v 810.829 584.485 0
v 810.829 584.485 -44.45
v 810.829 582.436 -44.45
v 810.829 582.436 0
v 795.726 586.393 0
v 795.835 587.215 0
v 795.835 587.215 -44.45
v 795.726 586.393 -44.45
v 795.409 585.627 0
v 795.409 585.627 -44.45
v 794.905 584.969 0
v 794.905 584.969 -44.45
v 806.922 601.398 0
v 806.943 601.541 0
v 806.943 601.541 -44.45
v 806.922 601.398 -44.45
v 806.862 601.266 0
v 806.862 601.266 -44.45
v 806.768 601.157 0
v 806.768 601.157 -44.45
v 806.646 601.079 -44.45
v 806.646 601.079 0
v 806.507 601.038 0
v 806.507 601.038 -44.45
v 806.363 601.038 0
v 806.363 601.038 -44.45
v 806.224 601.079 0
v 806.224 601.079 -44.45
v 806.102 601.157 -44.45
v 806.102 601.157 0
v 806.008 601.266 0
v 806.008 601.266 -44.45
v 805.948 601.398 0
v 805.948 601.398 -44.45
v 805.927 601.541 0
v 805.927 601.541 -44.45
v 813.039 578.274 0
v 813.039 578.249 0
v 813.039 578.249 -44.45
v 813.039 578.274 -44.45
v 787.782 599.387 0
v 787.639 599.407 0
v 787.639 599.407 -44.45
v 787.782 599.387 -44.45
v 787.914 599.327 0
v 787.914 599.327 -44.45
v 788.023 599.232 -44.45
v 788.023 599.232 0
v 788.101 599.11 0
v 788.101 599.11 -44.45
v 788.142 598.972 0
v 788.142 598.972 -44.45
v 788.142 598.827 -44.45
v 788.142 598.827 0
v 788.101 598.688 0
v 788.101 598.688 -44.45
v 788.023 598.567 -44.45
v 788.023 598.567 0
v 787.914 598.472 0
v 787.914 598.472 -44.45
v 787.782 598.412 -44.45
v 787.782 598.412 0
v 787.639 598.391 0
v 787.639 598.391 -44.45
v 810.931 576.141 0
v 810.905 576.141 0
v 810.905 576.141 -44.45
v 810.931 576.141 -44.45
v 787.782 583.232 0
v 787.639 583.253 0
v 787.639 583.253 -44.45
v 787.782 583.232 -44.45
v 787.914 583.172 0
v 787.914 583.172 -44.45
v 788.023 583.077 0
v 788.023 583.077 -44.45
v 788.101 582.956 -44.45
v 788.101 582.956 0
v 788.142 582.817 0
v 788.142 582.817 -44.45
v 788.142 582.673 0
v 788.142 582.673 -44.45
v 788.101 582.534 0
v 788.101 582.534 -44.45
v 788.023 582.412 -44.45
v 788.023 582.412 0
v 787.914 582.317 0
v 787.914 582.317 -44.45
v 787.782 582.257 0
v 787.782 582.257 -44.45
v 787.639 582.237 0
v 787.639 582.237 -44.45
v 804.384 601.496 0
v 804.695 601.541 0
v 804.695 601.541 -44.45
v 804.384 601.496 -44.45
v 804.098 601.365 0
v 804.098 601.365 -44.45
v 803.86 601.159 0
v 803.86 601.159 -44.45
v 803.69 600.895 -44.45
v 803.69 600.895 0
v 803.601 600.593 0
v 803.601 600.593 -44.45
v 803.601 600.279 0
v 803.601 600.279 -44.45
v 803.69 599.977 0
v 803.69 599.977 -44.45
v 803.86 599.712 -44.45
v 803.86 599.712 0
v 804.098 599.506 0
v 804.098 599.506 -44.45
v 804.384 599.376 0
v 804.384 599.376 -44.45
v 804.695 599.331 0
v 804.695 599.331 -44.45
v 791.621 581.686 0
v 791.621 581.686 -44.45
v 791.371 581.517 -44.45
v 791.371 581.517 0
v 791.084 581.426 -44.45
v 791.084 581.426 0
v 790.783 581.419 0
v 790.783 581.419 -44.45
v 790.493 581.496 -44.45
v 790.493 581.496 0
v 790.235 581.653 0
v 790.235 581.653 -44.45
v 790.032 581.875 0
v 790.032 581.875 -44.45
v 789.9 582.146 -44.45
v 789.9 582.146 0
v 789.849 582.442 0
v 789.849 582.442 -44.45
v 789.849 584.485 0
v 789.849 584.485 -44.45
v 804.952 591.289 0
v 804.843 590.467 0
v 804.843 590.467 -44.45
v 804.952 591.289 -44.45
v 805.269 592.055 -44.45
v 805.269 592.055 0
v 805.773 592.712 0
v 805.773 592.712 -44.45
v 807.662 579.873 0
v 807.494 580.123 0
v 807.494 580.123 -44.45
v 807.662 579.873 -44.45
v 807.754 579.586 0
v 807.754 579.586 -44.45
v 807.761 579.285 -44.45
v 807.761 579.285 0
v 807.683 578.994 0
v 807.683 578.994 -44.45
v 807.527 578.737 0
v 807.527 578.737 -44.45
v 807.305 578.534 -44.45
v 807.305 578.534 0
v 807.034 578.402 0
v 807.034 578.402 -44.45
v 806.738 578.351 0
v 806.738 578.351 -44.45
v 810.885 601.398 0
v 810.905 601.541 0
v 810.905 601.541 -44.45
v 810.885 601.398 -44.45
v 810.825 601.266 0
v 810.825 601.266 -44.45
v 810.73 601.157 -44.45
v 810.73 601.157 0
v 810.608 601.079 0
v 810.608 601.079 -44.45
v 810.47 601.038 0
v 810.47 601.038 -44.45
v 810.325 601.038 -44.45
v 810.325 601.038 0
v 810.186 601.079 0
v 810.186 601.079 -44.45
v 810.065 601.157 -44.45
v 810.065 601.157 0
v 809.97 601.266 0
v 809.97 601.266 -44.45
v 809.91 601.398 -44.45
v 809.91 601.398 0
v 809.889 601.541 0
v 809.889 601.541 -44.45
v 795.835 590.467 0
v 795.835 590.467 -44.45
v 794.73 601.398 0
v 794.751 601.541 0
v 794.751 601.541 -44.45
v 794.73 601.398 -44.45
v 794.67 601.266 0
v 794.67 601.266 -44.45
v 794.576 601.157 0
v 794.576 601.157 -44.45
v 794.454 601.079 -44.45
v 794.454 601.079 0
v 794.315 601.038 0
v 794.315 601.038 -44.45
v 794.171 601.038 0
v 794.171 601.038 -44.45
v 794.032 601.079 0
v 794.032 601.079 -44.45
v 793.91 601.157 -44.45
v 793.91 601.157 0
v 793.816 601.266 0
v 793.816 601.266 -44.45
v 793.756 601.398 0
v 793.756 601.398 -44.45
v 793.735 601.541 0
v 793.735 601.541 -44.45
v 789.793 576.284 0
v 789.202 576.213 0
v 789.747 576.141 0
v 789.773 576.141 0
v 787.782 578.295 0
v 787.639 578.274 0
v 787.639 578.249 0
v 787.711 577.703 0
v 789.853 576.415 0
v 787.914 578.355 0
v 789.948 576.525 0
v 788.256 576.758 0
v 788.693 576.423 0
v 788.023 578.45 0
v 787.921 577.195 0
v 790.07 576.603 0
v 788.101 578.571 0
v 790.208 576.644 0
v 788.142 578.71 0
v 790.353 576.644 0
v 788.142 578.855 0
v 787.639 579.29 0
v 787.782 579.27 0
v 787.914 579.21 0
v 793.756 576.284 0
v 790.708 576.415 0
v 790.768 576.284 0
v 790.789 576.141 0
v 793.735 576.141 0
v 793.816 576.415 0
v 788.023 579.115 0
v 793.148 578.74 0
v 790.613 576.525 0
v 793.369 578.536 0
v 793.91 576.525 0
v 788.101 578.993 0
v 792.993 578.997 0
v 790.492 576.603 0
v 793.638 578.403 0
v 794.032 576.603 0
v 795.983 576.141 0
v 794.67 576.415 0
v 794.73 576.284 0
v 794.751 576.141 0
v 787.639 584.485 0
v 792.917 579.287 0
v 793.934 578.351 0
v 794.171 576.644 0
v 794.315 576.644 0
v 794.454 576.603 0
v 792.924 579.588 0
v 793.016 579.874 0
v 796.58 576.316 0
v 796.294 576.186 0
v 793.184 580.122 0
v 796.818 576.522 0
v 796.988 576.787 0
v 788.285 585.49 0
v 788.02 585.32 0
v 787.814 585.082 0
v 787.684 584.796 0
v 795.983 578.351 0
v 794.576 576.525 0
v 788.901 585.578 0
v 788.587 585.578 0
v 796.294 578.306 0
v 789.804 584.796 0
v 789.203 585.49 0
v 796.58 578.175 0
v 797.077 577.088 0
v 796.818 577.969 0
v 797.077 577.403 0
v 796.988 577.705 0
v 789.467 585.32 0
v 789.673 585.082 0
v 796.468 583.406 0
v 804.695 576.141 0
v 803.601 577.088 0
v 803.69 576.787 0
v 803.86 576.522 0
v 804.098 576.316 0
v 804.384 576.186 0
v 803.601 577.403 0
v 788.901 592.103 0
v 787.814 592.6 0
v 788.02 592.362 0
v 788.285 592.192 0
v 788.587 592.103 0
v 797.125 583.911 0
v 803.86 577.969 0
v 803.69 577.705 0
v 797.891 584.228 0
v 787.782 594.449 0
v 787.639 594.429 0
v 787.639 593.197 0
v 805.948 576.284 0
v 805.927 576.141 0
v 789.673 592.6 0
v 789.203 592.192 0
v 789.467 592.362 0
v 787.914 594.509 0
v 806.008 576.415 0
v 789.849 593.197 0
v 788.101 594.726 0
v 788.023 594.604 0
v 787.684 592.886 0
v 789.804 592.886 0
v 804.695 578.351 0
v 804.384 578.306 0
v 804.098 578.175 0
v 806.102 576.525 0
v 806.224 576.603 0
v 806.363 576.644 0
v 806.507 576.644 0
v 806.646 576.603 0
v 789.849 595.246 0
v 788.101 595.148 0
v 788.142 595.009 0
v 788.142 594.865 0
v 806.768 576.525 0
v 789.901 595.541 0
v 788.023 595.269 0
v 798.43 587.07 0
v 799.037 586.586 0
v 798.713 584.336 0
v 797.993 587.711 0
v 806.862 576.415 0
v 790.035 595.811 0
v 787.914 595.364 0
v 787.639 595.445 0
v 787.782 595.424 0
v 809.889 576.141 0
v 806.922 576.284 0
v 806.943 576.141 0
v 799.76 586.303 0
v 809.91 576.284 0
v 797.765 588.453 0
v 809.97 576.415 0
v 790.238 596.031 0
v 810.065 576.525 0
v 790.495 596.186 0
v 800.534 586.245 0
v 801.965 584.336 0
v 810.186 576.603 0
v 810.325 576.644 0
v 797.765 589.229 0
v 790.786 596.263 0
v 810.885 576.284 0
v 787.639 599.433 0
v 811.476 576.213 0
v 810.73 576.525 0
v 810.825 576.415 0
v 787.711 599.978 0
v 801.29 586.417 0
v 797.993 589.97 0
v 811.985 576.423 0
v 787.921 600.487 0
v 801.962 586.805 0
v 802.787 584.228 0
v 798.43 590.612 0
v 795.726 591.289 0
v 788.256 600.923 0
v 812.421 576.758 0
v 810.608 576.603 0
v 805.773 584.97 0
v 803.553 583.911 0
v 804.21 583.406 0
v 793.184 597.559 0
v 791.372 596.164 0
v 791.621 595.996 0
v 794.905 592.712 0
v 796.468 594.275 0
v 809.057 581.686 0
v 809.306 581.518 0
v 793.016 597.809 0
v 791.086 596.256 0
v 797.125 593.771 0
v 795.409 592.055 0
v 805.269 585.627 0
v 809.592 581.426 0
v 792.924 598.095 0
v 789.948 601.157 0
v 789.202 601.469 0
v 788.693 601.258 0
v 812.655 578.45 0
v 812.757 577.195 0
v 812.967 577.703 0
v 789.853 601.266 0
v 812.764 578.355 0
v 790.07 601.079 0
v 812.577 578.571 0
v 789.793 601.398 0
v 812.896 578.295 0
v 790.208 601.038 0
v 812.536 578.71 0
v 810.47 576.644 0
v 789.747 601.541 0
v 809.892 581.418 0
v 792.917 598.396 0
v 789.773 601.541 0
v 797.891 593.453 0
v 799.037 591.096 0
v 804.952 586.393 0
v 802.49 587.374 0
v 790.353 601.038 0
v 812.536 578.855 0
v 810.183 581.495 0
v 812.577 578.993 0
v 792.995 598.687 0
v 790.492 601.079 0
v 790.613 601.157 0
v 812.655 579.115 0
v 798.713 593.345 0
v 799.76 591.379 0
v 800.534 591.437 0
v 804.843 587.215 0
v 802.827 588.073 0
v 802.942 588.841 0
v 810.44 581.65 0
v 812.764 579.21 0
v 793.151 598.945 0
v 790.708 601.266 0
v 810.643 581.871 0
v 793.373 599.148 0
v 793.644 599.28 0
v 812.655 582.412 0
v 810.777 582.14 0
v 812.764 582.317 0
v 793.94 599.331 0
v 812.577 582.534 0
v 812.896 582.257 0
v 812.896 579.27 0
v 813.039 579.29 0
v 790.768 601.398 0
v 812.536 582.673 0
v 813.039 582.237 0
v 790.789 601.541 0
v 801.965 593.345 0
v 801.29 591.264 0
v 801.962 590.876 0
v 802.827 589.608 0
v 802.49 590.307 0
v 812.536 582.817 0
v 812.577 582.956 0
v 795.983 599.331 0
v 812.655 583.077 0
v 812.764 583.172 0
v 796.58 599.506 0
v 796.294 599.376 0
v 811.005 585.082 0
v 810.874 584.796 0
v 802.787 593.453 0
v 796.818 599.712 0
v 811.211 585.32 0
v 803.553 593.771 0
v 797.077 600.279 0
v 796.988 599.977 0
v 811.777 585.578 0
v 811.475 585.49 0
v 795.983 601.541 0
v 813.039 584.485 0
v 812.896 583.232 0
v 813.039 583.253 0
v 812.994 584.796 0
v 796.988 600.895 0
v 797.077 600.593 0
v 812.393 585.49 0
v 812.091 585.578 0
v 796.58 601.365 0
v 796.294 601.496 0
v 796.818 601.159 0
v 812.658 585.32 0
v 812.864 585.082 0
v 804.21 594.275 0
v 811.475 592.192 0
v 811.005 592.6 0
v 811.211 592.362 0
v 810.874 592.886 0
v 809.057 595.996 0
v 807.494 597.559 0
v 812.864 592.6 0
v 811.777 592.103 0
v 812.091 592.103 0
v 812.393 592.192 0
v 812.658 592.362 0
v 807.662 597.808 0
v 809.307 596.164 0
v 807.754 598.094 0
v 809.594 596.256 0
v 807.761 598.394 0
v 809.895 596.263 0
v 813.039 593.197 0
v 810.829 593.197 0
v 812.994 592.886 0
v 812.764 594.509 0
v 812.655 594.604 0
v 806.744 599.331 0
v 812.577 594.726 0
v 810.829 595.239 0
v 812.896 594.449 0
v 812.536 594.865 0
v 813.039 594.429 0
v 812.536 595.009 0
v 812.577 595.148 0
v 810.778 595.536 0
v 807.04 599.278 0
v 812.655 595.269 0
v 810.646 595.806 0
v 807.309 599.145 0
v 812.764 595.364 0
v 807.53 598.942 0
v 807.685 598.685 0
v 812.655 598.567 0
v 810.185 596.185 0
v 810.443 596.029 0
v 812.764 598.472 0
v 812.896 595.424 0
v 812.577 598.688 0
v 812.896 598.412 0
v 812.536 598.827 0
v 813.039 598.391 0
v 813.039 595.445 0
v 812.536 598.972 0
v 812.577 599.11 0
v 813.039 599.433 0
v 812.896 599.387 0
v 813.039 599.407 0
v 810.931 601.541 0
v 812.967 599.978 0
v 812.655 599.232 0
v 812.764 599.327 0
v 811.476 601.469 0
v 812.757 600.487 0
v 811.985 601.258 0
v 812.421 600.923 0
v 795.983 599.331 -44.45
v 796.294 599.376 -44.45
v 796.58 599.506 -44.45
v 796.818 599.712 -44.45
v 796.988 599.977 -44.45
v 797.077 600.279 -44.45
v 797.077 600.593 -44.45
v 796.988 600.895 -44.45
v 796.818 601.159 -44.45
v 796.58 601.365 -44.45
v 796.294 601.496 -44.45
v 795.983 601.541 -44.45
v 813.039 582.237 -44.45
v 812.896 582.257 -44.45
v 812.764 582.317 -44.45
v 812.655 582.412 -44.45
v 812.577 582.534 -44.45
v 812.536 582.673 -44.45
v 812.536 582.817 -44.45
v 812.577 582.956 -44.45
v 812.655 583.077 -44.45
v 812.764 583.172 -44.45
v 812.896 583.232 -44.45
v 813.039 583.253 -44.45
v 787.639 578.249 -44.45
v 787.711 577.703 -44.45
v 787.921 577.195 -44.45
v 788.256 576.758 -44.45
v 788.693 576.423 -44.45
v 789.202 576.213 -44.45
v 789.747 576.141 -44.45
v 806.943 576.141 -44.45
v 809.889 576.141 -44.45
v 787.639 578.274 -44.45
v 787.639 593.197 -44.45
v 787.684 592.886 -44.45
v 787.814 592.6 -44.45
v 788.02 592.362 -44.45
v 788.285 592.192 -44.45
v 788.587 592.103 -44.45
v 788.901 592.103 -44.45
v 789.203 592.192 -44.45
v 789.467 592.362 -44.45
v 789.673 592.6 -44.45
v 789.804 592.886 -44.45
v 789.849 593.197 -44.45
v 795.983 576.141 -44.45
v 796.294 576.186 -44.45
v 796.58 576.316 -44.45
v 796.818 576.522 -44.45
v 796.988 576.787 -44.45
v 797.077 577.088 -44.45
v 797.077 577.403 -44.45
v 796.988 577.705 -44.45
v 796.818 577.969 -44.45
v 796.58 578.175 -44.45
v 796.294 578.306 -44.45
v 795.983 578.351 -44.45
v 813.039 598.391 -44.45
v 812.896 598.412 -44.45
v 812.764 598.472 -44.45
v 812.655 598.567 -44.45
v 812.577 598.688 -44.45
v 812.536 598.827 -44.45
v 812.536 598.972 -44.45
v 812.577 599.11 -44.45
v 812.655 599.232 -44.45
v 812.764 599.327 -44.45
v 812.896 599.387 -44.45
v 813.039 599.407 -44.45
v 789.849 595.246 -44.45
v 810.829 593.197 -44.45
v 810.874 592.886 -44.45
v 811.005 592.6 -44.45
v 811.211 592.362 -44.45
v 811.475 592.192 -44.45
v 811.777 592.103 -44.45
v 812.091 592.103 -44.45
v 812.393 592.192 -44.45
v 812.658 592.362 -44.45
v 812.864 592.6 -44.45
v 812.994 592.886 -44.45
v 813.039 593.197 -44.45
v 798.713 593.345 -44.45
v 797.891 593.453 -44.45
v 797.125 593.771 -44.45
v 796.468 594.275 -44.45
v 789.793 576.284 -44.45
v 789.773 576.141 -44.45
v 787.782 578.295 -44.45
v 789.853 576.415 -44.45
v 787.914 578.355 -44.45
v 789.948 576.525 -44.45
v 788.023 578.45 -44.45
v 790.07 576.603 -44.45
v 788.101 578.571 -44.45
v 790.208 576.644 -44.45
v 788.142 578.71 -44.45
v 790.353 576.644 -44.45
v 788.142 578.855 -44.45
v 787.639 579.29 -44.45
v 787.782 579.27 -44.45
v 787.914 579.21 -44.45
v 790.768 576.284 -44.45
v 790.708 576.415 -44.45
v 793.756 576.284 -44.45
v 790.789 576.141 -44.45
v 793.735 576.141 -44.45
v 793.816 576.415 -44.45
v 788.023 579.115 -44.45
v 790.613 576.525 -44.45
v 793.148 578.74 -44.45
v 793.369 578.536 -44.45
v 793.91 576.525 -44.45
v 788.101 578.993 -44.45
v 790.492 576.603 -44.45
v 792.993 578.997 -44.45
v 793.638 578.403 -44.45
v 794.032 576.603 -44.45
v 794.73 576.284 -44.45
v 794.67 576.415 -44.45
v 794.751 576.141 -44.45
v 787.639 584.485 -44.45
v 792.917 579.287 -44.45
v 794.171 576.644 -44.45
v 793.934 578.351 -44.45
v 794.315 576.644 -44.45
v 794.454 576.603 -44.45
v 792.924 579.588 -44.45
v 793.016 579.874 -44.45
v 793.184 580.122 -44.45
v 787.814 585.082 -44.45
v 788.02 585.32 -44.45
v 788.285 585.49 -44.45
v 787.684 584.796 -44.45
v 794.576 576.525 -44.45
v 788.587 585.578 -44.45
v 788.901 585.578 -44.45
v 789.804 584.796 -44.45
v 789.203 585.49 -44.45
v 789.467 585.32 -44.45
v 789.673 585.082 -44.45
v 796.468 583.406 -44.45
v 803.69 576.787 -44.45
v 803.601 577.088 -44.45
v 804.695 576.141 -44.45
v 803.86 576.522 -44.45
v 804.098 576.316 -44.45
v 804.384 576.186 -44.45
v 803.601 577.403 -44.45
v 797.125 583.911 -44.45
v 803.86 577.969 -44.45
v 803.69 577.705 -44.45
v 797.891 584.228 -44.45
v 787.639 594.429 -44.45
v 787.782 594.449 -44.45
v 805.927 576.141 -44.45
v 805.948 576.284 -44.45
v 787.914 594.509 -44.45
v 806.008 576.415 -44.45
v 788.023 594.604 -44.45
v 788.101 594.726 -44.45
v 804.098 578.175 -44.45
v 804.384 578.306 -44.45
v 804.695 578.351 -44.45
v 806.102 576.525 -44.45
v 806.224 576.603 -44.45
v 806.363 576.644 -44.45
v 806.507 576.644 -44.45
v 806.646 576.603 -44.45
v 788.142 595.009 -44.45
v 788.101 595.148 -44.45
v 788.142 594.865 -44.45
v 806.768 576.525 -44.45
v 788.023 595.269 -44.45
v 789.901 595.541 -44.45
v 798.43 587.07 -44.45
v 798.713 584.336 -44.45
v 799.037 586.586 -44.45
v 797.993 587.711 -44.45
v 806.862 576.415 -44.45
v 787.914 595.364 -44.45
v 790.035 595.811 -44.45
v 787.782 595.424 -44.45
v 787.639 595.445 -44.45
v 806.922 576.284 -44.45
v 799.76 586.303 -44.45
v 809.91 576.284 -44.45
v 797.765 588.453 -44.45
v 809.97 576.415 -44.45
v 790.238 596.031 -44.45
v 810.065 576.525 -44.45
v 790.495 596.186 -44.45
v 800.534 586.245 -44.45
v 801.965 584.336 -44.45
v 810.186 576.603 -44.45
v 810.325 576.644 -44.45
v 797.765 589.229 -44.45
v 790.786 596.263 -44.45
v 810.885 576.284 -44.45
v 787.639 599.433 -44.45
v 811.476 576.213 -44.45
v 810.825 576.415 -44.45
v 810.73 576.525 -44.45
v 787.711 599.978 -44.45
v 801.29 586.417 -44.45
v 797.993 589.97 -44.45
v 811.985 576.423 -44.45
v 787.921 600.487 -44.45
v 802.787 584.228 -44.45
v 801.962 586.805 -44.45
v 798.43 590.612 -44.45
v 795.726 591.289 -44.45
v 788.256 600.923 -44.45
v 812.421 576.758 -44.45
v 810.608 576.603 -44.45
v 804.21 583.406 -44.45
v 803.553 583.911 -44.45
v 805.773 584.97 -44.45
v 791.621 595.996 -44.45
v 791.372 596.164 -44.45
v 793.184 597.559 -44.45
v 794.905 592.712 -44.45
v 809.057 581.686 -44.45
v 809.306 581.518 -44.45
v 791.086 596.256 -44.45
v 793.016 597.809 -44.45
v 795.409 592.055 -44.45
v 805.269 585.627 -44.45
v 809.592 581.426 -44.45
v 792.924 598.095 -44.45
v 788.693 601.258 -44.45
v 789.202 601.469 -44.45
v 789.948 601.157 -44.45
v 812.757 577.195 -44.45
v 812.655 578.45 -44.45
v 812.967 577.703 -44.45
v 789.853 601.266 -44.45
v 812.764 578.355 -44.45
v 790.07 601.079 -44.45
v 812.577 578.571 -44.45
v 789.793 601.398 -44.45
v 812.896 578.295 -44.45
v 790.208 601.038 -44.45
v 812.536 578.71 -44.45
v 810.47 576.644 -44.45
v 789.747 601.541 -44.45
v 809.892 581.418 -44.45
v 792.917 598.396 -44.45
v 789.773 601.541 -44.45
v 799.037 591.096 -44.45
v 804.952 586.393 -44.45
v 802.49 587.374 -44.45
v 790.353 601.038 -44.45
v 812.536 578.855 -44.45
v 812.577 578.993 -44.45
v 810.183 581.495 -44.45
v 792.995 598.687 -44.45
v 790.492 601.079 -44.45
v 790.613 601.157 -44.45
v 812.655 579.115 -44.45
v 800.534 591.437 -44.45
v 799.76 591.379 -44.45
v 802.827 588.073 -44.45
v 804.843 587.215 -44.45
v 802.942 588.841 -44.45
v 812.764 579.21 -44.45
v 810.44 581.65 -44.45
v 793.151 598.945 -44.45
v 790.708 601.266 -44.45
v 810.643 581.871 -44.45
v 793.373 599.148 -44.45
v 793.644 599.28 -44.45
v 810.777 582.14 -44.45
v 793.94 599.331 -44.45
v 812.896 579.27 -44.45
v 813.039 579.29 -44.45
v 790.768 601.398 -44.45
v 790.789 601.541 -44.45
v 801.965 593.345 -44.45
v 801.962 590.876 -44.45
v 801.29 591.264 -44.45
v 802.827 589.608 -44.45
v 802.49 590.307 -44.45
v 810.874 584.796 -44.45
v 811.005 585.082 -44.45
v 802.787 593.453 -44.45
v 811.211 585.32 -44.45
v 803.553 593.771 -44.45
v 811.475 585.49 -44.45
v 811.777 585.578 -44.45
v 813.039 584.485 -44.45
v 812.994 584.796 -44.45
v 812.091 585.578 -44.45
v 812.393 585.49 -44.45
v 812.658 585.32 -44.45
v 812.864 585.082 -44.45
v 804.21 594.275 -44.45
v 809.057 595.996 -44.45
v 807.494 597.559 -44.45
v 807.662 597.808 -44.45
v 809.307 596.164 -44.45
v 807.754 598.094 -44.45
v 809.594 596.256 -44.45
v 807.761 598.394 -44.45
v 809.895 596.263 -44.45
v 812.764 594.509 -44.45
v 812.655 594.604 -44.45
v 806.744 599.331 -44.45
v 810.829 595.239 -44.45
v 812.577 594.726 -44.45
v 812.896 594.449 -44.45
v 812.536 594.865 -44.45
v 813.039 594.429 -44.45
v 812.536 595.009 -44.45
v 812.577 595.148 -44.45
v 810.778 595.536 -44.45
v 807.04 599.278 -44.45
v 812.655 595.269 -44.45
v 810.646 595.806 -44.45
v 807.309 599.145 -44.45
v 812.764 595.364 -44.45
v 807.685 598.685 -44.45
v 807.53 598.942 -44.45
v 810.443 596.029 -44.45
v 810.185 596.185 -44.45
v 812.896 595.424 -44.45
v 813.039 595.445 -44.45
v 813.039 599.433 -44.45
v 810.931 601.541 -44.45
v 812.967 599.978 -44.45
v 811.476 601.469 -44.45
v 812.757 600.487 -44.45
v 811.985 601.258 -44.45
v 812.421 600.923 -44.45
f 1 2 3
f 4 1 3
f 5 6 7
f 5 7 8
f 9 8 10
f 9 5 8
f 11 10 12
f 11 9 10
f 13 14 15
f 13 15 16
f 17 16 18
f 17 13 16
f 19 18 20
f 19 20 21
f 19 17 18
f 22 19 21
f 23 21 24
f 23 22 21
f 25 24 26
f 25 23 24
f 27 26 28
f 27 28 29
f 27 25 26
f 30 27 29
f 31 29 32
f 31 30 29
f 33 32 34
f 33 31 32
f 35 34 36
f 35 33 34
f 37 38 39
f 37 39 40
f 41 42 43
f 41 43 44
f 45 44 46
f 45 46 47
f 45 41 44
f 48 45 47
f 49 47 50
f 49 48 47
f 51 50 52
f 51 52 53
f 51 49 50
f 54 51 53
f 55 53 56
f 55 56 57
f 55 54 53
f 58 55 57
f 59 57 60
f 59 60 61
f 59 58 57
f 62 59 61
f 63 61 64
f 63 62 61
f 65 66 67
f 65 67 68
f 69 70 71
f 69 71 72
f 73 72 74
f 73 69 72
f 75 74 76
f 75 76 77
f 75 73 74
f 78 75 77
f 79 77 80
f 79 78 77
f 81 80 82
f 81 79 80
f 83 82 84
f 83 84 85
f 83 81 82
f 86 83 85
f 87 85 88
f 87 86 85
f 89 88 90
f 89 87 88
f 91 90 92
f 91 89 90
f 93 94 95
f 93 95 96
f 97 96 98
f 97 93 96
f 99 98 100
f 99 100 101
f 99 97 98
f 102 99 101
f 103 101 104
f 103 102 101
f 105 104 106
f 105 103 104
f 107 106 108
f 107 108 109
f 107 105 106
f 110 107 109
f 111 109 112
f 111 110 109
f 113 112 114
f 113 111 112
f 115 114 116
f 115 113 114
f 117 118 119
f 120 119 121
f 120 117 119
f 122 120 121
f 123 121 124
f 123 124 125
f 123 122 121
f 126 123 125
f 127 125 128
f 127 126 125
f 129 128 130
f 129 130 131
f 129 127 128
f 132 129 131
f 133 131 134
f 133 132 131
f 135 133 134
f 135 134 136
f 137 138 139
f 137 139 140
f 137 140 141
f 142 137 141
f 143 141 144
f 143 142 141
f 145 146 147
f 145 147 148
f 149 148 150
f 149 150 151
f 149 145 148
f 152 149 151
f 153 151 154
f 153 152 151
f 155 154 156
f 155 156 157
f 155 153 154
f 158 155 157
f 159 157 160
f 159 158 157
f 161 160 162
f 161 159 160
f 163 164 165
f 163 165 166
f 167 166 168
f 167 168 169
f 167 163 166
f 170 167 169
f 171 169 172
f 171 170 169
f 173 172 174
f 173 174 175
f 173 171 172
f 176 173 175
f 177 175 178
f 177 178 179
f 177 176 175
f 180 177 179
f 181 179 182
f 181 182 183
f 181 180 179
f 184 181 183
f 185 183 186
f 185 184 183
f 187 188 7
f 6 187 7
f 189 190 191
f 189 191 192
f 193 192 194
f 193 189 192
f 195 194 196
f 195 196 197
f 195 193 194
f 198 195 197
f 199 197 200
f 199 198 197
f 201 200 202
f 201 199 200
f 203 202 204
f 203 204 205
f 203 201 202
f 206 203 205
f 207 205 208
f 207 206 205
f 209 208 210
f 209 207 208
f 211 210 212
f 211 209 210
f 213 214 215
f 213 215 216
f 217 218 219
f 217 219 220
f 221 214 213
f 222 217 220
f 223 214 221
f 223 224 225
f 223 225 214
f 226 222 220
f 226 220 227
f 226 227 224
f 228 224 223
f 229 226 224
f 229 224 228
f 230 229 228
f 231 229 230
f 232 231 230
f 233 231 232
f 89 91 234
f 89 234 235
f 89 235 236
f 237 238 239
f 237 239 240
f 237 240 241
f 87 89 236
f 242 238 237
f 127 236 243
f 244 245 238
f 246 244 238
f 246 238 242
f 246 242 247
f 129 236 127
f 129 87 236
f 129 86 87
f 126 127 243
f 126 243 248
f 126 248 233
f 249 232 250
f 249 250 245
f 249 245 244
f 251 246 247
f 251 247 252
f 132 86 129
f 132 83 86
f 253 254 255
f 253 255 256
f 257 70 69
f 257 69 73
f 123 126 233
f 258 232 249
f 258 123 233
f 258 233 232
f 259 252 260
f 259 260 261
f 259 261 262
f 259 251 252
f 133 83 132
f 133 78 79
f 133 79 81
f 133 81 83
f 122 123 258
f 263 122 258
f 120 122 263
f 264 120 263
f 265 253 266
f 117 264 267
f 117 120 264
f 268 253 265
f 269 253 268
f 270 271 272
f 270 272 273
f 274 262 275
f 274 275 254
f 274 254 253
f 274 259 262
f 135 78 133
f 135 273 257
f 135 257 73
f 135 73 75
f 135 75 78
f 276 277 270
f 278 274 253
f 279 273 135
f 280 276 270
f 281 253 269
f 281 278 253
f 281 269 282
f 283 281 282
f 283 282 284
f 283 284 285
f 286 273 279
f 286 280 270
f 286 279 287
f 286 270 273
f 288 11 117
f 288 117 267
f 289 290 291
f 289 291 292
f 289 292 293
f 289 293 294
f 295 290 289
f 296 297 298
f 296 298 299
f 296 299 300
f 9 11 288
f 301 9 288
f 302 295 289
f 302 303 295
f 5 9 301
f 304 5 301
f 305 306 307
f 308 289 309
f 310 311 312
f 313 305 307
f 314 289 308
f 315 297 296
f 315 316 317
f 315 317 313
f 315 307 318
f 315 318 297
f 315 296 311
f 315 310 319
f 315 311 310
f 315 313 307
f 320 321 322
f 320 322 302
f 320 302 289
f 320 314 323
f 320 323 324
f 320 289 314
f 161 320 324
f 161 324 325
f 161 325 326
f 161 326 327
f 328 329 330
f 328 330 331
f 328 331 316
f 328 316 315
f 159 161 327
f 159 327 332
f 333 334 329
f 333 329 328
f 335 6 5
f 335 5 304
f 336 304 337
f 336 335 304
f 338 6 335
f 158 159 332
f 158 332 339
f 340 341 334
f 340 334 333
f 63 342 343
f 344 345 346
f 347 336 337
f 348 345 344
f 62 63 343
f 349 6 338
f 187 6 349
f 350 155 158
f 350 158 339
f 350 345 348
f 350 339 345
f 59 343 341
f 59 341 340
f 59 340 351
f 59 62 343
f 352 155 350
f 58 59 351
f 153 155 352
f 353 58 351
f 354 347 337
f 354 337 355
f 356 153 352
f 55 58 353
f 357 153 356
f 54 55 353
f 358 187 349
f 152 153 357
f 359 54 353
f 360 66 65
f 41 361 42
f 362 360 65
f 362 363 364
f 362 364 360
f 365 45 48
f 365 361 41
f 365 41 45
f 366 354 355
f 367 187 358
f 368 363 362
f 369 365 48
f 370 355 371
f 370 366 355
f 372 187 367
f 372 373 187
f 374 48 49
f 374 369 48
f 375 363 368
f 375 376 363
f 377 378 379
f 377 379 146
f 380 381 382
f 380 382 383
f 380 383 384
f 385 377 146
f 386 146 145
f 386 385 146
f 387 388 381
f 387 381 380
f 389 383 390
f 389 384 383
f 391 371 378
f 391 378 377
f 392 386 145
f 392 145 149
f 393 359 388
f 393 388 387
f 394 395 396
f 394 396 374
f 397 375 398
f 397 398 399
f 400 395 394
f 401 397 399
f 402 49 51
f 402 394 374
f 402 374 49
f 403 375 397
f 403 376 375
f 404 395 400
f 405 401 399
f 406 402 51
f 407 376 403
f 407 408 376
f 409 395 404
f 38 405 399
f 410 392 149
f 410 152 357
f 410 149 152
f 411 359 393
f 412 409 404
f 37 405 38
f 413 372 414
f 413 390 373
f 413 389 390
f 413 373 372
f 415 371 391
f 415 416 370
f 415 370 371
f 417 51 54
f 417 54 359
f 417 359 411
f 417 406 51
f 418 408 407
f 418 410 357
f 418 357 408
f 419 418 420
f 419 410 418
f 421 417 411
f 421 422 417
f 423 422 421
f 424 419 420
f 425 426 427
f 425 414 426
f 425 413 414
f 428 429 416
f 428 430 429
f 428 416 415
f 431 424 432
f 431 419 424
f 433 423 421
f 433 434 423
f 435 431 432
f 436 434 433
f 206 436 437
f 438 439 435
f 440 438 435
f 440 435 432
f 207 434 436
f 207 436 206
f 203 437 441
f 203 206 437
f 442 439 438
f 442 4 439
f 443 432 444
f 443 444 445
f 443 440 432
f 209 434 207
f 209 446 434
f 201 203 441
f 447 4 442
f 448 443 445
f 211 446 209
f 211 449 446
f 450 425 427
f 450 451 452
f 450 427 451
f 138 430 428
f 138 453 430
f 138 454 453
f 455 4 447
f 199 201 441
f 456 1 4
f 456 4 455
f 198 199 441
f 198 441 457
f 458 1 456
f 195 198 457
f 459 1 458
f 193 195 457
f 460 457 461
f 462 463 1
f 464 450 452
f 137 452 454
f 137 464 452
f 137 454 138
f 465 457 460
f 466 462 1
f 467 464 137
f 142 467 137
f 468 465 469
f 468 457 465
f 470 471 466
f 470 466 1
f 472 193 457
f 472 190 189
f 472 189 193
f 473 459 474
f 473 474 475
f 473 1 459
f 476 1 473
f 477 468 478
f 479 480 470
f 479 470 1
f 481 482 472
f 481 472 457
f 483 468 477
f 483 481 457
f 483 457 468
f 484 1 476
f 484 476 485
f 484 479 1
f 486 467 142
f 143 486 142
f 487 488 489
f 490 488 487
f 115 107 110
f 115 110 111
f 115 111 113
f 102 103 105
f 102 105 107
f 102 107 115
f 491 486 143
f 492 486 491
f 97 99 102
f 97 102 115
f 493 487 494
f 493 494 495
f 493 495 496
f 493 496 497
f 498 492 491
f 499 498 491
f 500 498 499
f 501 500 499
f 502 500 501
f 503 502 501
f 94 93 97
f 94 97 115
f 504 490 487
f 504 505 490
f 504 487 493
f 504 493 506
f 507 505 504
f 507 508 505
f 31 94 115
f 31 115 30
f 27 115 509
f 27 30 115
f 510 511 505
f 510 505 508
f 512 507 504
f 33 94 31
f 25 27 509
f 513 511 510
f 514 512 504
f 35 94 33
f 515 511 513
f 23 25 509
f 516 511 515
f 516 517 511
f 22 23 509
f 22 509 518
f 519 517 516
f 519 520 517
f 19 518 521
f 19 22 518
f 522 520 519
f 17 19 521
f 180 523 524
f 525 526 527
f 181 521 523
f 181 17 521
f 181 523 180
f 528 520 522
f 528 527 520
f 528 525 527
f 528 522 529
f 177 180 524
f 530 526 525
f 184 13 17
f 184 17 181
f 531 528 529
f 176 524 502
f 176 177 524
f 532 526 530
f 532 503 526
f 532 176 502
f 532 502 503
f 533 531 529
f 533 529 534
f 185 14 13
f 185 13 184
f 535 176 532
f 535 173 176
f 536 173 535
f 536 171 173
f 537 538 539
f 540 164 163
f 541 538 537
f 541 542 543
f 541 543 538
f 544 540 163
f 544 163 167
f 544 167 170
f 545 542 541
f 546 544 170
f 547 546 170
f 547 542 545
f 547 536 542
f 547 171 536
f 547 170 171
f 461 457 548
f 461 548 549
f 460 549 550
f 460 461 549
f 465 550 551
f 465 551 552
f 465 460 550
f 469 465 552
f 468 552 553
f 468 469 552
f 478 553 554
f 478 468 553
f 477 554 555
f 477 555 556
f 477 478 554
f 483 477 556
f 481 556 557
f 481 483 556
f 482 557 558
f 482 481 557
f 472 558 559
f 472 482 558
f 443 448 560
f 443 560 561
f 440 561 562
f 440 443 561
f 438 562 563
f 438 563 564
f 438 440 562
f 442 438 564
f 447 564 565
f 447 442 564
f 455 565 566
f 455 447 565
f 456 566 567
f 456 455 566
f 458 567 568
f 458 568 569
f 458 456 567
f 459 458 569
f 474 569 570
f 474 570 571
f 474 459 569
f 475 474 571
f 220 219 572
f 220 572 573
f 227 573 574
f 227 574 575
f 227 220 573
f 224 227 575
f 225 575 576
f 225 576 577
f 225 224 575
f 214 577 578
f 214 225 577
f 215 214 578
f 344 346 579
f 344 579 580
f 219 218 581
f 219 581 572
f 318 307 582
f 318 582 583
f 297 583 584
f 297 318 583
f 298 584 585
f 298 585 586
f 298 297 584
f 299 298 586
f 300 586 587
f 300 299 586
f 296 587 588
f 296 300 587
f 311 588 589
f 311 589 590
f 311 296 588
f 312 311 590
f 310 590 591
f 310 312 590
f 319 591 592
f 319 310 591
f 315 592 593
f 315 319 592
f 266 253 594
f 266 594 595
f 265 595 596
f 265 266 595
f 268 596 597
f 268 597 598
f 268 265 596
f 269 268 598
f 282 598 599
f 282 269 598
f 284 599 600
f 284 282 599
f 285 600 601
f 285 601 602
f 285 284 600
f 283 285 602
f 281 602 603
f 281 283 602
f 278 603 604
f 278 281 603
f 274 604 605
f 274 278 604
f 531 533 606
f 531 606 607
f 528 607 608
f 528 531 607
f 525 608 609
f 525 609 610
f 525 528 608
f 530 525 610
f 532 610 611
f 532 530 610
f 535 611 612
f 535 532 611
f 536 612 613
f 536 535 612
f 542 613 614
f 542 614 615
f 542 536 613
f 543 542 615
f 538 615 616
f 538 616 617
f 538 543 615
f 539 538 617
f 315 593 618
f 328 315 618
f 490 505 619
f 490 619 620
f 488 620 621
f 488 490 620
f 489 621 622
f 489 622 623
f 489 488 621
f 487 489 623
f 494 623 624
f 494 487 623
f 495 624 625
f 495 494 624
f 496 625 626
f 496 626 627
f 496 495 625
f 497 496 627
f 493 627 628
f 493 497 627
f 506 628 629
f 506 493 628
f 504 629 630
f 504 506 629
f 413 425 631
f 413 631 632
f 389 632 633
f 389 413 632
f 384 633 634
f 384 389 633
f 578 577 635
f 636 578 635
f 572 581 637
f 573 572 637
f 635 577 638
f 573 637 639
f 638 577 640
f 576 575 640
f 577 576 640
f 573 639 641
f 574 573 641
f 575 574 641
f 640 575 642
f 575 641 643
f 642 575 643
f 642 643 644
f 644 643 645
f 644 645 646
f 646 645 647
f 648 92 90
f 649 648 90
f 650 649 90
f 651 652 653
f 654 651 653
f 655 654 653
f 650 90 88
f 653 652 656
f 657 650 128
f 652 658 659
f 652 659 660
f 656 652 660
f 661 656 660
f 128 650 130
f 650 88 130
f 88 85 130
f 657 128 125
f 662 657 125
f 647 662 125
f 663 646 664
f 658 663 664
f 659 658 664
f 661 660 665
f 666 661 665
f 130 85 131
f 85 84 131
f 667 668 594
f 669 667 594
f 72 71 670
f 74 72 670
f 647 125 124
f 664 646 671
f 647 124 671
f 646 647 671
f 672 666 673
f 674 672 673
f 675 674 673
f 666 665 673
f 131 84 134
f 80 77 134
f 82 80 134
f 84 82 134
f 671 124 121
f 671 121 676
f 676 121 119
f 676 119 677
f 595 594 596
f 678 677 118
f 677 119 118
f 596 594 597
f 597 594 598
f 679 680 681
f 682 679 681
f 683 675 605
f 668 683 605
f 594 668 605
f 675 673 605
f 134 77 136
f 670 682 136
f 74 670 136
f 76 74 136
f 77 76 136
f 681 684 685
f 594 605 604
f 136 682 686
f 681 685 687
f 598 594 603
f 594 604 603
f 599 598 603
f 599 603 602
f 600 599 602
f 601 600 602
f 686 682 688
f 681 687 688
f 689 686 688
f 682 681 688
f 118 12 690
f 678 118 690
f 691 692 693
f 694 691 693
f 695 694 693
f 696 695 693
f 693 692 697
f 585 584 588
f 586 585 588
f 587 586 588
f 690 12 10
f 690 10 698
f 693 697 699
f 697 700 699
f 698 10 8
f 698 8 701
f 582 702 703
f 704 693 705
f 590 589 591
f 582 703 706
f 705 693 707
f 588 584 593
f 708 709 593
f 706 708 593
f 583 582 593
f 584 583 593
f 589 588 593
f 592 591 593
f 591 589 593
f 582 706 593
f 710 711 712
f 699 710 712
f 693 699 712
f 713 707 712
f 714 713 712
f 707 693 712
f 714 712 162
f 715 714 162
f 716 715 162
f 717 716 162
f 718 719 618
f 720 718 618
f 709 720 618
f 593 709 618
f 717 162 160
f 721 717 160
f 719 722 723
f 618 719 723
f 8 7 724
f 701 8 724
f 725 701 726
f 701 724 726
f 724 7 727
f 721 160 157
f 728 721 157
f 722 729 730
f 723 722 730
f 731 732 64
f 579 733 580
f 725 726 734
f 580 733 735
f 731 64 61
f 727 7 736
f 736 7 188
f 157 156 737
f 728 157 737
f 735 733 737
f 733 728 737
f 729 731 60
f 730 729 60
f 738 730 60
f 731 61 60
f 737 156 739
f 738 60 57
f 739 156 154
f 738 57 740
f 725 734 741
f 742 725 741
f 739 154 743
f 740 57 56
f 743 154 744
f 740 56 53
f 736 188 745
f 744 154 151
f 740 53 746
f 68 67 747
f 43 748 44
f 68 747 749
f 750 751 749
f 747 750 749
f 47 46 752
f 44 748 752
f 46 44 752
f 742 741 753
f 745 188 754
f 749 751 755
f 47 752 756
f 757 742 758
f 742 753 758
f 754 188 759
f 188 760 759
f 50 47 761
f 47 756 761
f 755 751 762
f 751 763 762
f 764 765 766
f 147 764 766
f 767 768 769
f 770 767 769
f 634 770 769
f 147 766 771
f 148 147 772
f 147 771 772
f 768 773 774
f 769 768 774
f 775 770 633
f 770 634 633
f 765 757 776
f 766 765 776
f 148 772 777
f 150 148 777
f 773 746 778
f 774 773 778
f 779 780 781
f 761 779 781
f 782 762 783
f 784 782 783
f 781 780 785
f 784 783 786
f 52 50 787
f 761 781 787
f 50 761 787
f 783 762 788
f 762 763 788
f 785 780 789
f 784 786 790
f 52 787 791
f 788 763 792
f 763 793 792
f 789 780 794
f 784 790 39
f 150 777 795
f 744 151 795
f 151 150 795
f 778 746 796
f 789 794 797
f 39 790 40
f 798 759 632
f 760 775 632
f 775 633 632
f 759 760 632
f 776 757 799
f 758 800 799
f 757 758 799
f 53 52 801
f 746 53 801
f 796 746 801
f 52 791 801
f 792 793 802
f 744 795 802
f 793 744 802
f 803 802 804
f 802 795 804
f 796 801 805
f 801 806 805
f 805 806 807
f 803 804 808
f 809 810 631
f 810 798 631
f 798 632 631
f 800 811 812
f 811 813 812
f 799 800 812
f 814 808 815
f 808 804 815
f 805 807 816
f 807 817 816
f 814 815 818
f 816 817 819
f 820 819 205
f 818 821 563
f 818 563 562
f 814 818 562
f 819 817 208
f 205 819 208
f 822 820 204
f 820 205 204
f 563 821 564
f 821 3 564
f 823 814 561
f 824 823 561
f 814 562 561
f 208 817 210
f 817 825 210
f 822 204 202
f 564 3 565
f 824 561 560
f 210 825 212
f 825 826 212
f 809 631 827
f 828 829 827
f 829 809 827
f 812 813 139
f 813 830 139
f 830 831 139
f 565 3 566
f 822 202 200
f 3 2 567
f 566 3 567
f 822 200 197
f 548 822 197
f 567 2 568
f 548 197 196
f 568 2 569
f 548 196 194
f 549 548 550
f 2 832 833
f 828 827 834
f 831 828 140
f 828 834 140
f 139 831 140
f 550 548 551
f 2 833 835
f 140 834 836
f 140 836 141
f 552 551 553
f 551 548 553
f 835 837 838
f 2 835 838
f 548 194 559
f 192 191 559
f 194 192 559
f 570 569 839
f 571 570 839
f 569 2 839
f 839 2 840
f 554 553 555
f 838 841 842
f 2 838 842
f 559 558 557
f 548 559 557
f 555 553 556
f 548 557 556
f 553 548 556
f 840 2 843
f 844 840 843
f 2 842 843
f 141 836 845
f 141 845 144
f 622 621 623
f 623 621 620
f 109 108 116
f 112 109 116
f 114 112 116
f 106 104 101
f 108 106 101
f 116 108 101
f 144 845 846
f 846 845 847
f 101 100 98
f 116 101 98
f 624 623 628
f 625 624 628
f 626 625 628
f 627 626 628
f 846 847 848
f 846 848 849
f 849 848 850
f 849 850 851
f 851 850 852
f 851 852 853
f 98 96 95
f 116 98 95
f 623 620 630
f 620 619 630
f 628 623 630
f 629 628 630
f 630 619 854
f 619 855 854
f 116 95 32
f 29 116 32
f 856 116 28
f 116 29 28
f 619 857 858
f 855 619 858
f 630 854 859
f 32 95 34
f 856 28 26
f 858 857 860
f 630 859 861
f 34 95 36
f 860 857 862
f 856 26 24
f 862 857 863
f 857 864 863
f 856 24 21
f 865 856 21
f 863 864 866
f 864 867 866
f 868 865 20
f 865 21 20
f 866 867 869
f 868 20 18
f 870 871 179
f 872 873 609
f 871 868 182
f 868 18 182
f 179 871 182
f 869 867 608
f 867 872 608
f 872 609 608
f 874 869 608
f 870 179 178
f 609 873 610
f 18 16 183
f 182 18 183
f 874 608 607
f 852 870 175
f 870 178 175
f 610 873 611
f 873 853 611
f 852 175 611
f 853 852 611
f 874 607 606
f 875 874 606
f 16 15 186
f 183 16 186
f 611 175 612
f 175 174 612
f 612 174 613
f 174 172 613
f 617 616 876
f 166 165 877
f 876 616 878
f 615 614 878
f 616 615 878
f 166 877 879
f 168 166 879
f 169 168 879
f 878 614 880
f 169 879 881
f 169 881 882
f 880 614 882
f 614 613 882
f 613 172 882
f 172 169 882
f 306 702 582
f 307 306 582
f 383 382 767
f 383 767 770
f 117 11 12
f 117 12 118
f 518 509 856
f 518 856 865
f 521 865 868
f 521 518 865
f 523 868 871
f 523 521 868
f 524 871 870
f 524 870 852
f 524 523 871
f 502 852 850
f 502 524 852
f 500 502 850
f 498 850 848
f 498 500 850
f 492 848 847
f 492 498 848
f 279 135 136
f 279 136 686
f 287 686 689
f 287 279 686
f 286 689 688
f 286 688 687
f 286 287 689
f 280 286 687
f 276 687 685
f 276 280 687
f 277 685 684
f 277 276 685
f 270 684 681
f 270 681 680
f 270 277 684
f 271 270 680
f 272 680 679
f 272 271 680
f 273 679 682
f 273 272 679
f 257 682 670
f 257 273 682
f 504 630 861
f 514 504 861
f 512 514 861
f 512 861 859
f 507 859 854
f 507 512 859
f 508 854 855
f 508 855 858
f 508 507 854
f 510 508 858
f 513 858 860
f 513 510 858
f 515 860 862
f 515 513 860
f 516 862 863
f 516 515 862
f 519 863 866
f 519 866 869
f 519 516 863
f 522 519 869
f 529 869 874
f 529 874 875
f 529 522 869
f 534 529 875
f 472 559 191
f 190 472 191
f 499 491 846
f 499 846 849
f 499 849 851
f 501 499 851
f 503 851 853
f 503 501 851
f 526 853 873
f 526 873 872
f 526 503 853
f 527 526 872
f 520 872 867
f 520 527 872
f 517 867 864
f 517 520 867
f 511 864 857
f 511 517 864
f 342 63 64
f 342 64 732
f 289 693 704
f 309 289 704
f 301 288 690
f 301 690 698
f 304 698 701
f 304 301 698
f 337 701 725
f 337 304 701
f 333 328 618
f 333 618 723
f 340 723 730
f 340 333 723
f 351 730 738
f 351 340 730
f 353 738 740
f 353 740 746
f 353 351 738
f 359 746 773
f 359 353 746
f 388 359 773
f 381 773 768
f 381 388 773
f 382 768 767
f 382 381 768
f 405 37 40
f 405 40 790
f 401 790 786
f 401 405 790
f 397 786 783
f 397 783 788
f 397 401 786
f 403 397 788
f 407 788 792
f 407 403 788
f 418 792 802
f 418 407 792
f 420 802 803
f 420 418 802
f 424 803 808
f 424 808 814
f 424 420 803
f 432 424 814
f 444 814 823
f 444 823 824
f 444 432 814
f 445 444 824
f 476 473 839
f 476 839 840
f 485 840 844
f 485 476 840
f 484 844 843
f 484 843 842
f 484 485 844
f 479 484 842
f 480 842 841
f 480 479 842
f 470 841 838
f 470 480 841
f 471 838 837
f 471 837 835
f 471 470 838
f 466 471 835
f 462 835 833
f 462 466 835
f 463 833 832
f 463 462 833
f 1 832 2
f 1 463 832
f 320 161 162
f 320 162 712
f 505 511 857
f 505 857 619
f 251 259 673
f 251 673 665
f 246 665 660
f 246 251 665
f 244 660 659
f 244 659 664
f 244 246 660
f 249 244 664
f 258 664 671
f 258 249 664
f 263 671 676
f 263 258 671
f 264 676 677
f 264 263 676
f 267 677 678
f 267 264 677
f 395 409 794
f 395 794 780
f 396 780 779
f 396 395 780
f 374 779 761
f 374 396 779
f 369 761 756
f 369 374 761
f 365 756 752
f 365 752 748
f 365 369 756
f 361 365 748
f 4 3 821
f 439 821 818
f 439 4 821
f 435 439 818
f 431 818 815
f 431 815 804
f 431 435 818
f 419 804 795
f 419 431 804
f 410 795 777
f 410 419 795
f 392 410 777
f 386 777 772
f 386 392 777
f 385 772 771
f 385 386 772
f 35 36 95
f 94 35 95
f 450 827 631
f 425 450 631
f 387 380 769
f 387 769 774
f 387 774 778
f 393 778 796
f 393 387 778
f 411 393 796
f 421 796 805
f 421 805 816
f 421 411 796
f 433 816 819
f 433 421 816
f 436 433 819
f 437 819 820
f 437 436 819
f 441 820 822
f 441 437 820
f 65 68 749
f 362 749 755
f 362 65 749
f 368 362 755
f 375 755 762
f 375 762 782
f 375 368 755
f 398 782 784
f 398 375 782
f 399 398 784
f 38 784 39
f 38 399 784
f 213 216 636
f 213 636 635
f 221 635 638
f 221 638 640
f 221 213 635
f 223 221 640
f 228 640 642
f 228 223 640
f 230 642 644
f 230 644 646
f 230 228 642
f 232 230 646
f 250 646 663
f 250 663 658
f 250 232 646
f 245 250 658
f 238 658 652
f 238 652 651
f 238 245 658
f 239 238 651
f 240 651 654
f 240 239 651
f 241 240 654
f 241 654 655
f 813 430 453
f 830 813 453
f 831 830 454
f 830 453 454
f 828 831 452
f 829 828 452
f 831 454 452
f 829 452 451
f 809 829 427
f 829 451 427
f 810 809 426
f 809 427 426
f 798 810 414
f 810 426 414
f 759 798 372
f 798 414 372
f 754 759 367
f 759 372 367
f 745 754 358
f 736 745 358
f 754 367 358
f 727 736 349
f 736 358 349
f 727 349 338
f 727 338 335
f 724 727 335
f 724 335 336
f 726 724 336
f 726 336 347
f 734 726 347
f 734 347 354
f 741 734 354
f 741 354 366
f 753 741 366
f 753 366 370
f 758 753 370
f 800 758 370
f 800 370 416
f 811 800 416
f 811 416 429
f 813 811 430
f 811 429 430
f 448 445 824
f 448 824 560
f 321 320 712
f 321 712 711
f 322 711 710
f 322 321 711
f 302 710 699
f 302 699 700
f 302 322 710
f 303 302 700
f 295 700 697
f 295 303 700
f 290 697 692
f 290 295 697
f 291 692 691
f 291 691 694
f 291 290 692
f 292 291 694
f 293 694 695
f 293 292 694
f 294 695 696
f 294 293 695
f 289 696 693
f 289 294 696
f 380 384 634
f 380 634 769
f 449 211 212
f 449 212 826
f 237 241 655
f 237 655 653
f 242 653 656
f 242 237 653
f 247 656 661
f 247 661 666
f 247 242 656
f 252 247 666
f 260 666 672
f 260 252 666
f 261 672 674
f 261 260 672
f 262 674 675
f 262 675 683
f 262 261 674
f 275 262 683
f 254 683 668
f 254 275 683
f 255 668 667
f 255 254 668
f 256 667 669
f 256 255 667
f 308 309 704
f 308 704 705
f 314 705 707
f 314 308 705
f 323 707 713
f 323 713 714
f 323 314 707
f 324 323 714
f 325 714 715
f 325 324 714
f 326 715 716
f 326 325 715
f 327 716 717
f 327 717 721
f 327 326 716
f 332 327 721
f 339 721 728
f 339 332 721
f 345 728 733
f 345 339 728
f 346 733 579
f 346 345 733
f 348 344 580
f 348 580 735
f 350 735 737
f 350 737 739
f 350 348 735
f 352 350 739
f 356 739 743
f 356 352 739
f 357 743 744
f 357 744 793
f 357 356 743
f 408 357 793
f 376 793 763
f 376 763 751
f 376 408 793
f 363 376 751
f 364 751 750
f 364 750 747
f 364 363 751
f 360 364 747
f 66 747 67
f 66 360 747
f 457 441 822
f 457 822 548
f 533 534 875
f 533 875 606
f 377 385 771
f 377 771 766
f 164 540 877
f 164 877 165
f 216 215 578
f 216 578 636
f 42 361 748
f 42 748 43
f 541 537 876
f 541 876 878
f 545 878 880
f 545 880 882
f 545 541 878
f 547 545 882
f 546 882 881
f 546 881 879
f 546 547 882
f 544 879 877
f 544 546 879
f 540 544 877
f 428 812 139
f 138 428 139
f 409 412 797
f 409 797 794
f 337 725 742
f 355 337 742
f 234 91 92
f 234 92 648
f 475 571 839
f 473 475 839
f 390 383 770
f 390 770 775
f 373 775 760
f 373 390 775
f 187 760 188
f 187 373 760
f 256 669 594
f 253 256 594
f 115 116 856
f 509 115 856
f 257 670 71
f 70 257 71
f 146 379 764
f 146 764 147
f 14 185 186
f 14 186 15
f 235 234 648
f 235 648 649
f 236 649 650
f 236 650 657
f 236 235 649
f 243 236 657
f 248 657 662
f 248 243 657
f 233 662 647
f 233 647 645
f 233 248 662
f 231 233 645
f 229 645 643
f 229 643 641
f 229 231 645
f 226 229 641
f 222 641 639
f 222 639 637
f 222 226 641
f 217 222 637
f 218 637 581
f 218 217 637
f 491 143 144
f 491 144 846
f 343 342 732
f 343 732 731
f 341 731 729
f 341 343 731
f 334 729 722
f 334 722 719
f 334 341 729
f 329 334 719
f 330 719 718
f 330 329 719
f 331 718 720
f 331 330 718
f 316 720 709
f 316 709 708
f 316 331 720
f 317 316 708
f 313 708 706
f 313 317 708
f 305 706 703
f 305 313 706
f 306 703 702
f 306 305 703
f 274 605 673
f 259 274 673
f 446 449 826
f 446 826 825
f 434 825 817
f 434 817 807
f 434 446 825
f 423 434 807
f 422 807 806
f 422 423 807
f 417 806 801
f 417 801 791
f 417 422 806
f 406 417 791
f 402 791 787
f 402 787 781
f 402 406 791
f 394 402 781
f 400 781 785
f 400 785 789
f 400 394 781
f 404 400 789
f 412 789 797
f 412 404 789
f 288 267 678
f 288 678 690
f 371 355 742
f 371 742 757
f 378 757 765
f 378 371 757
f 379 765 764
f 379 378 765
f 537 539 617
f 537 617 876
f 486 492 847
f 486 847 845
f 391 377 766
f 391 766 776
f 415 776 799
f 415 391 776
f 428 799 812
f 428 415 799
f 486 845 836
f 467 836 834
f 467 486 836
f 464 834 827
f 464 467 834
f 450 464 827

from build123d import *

# Parameters (mm, degrees)
SKETCH1_R      = 2.6035
EXTRUDE1_DEPTH = 44.45


with BuildPart() as part:
    # Sketch1 → Extrude1 (new body)
    with BuildSketch(Plane.XY):
        with BuildLine():
            Line((813.038976674, 579.290424026), (813.038976674, 582.236824026))
            ThreePointArc((813.038976674, 582.236824026), (812.530976674, 582.744824026), (813.038976674, 583.252824026))
            Line((813.038976674, 583.252824026), (813.038976674, 584.484724026))
            ThreePointArc((813.038976674, 584.484724026), (811.934076674, 585.589624026), (810.829176674, 584.484724026))
            Line((810.829176674, 584.484724026), (810.829176674, 582.435874947))
            ThreePointArc((810.829176674, 582.435874947), (810.182743454, 581.495163196), (809.057340701, 581.685644565))
            Line((809.057340701, 581.685644565), (805.773323088, 584.969563516))
            ThreePointArc((805.773323088, 584.969563516), (805.085045004, 585.999619341), (804.843353394, 587.214661271))
            Line((804.843353394, 587.214661271), (804.843353394, 590.467068589))
            ThreePointArc((804.843353394, 590.467068589), (805.085043572, 591.682107061), (805.773317796, 592.712161052))
            Line((805.773317796, 592.712161052), (809.057121325, 595.995881407))
            ThreePointArc((809.057121325, 595.995881407), (810.18544278, 596.185153907), (810.829176674, 595.239352628))
            Line((810.829176674, 595.239352628), (810.829176674, 593.196924026))
            ThreePointArc((810.829176674, 593.196924026), (811.934076674, 592.092024026), (813.038976674, 593.196924026))
            Line((813.038976674, 593.196924026), (813.038976674, 594.428824026))
            ThreePointArc((813.038976674, 594.428824026), (812.530976674, 594.936824026), (813.038976674, 595.444824026))
            Line((813.038976674, 595.444824026), (813.038976674, 598.391224026))
            ThreePointArc((813.038976674, 598.391224026), (812.530976674, 598.899224026), (813.038976674, 599.407224026))
            Line((813.038976674, 599.407224026), (813.038976674, 599.432624026))
            ThreePointArc((813.038976674, 599.432624026), (812.42149919, 600.923346542), (810.930776674, 601.540824026))
            Line((810.930776674, 601.540824026), (810.905376674, 601.540824026))
            ThreePointArc((810.905376674, 601.540824026), (810.397376674, 601.032824026), (809.889376674, 601.540824026))
            Line((809.889376674, 601.540824026), (806.942976674, 601.540824026))
            ThreePointArc((806.942976674, 601.540824026), (806.434976674, 601.032824026), (805.926976674, 601.540824026))
            Line((805.926976674, 601.540824026), (804.695076674, 601.540824026))
            ThreePointArc((804.695076674, 601.540824026), (803.590176674, 600.435924026), (804.695076674, 599.331024026))
            Line((804.695076674, 599.331024026), (806.743925753, 599.331024026))
            ThreePointArc((806.743925753, 599.331024026), (807.684637504, 598.684590806), (807.494156135, 597.559188053))
            Line((807.494156135, 597.559188053), (804.210237184, 594.27517044))
            ThreePointArc((804.210237184, 594.27517044), (803.180181359, 593.586892356), (801.965139429, 593.345200745))
            Line((801.965139429, 593.345200745), (798.712732111, 593.345200745))
            ThreePointArc((798.712732111, 593.345200745), (797.497693639, 593.586890924), (796.467639648, 594.275165148))
            Line((796.467639648, 594.275165148), (793.183919293, 597.558968677))
            ThreePointArc((793.183919293, 597.558968677), (792.994646793, 598.687290132), (793.940448072, 599.331024026))
            Line((793.940448072, 599.331024026), (795.982876674, 599.331024026))
            ThreePointArc((795.982876674, 599.331024026), (797.087776674, 600.435924026), (795.982876674, 601.540824026))
            Line((795.982876674, 601.540824026), (794.750976674, 601.540824026))
            ThreePointArc((794.750976674, 601.540824026), (794.242976674, 601.032824026), (793.734976674, 601.540824026))
            Line((793.734976674, 601.540824026), (790.788576674, 601.540824026))
            ThreePointArc((790.788576674, 601.540824026), (790.280576674, 601.032824026), (789.772576674, 601.540824026))
            Line((789.772576674, 601.540824026), (789.747176674, 601.540824026))
            ThreePointArc((789.747176674, 601.540824026), (788.256454158, 600.923346542), (787.638976674, 599.432624026))
            Line((787.638976674, 599.432624026), (787.638976674, 599.407224026))
            ThreePointArc((787.638976674, 599.407224026), (788.146976674, 598.899224026), (787.638976674, 598.391224026))
            Line((787.638976674, 598.391224026), (787.638976674, 595.444824026))
            ThreePointArc((787.638976674, 595.444824026), (788.146976674, 594.936824026), (787.638976674, 594.428824026))
            Line((787.638976674, 594.428824026), (787.638976674, 593.196924026))
            ThreePointArc((787.638976674, 593.196924026), (788.743876674, 592.092024026), (789.848776674, 593.196924026))
            Line((789.848776674, 593.196924026), (789.848776674, 595.245773105))
            ThreePointArc((789.848776674, 595.245773105), (790.495209894, 596.186484856), (791.620612647, 595.996003487))
            Line((791.620612647, 595.996003487), (794.90463026, 592.712084536))
            ThreePointArc((794.90463026, 592.712084536), (795.592908344, 591.682028711), (795.834599954, 590.466986781))
            Line((795.834599954, 590.466986781), (795.834599954, 587.214579463))
            ThreePointArc((795.834599954, 587.214579463), (795.592909776, 585.999540991), (794.904635552, 584.969487))
            Line((794.904635552, 584.969487), (791.620832022, 581.685766645))
            ThreePointArc((791.620832022, 581.685766645), (790.492510568, 581.496494145), (789.848776674, 582.442295424))
            Line((789.848776674, 582.442295424), (789.848776674, 584.484724026))
            ThreePointArc((789.848776674, 584.484724026), (788.743876674, 585.589624026), (787.638976674, 584.484724026))
            Line((787.638976674, 584.484724026), (787.638976674, 583.252824026))
            ThreePointArc((787.638976674, 583.252824026), (788.146976674, 582.744824026), (787.638976674, 582.236824026))
            Line((787.638976674, 582.236824026), (787.638976674, 579.290424026))
            ThreePointArc((787.638976674, 579.290424026), (788.146976674, 578.782424026), (787.638976674, 578.274424026))
            Line((787.638976674, 578.274424026), (787.638976674, 578.249024026))
            ThreePointArc((787.638976674, 578.249024026), (788.256454158, 576.75830151), (789.747176674, 576.140824026))
            Line((789.747176674, 576.140824026), (789.772576674, 576.140824026))
            ThreePointArc((789.772576674, 576.140824026), (790.280576674, 576.648824026), (790.788576674, 576.140824026))
            Line((790.788576674, 576.140824026), (793.734976674, 576.140824026))
            ThreePointArc((793.734976674, 576.140824026), (794.242976674, 576.648824026), (794.750976674, 576.140824026))
            Line((794.750976674, 576.140824026), (795.982876674, 576.140824026))
            ThreePointArc((795.982876674, 576.140824026), (797.087776674, 577.245724026), (795.982876674, 578.350624026))
            Line((795.982876674, 578.350624026), (793.934027595, 578.350624026))
            ThreePointArc((793.934027595, 578.350624026), (792.993315844, 578.997057246), (793.183797213, 580.122459999))
            Line((793.183797213, 580.122459999), (796.467716164, 583.406477612))
            ThreePointArc((796.467716164, 583.406477612), (797.497771989, 584.094755696), (798.712813919, 584.336447306))
            Line((798.712813919, 584.336447306), (801.965221237, 584.336447306))
            ThreePointArc((801.965221237, 584.336447306), (803.180259709, 584.094757128), (804.2103137, 583.406482904))
            Line((804.2103137, 583.406482904), (807.494034055, 580.122679374))
            ThreePointArc((807.494034055, 580.122679374), (807.683306555, 578.99435792), (806.737505276, 578.350624026))
            Line((806.737505276, 578.350624026), (804.695076674, 578.350624026))
            ThreePointArc((804.695076674, 578.350624026), (803.590176674, 577.245724026), (804.695076674, 576.140824026))
            Line((804.695076674, 576.140824026), (805.926976674, 576.140824026))
            ThreePointArc((805.926976674, 576.140824026), (806.434976674, 576.648824026), (806.942976674, 576.140824026))
            Line((806.942976674, 576.140824026), (809.889376674, 576.140824026))
            ThreePointArc((809.889376674, 576.140824026), (810.397376674, 576.648824026), (810.905376674, 576.140824026))
            Line((810.905376674, 576.140824026), (810.930776674, 576.140824026))
            ThreePointArc((810.930776674, 576.140824026), (812.42149919, 576.75830151), (813.038976674, 578.249024026))
            Line((813.038976674, 578.249024026), (813.038976674, 578.274424026))
            ThreePointArc((813.038976674, 578.274424026), (812.530976674, 578.782424026), (813.038976674, 579.290424026))
        make_face()
        with Locations((800.338976674, 588.840824026)):
            Circle(SKETCH1_R, mode=Mode.SUBTRACT)
    extrude(amount=-EXTRUDE1_DEPTH)


solid = part.part
